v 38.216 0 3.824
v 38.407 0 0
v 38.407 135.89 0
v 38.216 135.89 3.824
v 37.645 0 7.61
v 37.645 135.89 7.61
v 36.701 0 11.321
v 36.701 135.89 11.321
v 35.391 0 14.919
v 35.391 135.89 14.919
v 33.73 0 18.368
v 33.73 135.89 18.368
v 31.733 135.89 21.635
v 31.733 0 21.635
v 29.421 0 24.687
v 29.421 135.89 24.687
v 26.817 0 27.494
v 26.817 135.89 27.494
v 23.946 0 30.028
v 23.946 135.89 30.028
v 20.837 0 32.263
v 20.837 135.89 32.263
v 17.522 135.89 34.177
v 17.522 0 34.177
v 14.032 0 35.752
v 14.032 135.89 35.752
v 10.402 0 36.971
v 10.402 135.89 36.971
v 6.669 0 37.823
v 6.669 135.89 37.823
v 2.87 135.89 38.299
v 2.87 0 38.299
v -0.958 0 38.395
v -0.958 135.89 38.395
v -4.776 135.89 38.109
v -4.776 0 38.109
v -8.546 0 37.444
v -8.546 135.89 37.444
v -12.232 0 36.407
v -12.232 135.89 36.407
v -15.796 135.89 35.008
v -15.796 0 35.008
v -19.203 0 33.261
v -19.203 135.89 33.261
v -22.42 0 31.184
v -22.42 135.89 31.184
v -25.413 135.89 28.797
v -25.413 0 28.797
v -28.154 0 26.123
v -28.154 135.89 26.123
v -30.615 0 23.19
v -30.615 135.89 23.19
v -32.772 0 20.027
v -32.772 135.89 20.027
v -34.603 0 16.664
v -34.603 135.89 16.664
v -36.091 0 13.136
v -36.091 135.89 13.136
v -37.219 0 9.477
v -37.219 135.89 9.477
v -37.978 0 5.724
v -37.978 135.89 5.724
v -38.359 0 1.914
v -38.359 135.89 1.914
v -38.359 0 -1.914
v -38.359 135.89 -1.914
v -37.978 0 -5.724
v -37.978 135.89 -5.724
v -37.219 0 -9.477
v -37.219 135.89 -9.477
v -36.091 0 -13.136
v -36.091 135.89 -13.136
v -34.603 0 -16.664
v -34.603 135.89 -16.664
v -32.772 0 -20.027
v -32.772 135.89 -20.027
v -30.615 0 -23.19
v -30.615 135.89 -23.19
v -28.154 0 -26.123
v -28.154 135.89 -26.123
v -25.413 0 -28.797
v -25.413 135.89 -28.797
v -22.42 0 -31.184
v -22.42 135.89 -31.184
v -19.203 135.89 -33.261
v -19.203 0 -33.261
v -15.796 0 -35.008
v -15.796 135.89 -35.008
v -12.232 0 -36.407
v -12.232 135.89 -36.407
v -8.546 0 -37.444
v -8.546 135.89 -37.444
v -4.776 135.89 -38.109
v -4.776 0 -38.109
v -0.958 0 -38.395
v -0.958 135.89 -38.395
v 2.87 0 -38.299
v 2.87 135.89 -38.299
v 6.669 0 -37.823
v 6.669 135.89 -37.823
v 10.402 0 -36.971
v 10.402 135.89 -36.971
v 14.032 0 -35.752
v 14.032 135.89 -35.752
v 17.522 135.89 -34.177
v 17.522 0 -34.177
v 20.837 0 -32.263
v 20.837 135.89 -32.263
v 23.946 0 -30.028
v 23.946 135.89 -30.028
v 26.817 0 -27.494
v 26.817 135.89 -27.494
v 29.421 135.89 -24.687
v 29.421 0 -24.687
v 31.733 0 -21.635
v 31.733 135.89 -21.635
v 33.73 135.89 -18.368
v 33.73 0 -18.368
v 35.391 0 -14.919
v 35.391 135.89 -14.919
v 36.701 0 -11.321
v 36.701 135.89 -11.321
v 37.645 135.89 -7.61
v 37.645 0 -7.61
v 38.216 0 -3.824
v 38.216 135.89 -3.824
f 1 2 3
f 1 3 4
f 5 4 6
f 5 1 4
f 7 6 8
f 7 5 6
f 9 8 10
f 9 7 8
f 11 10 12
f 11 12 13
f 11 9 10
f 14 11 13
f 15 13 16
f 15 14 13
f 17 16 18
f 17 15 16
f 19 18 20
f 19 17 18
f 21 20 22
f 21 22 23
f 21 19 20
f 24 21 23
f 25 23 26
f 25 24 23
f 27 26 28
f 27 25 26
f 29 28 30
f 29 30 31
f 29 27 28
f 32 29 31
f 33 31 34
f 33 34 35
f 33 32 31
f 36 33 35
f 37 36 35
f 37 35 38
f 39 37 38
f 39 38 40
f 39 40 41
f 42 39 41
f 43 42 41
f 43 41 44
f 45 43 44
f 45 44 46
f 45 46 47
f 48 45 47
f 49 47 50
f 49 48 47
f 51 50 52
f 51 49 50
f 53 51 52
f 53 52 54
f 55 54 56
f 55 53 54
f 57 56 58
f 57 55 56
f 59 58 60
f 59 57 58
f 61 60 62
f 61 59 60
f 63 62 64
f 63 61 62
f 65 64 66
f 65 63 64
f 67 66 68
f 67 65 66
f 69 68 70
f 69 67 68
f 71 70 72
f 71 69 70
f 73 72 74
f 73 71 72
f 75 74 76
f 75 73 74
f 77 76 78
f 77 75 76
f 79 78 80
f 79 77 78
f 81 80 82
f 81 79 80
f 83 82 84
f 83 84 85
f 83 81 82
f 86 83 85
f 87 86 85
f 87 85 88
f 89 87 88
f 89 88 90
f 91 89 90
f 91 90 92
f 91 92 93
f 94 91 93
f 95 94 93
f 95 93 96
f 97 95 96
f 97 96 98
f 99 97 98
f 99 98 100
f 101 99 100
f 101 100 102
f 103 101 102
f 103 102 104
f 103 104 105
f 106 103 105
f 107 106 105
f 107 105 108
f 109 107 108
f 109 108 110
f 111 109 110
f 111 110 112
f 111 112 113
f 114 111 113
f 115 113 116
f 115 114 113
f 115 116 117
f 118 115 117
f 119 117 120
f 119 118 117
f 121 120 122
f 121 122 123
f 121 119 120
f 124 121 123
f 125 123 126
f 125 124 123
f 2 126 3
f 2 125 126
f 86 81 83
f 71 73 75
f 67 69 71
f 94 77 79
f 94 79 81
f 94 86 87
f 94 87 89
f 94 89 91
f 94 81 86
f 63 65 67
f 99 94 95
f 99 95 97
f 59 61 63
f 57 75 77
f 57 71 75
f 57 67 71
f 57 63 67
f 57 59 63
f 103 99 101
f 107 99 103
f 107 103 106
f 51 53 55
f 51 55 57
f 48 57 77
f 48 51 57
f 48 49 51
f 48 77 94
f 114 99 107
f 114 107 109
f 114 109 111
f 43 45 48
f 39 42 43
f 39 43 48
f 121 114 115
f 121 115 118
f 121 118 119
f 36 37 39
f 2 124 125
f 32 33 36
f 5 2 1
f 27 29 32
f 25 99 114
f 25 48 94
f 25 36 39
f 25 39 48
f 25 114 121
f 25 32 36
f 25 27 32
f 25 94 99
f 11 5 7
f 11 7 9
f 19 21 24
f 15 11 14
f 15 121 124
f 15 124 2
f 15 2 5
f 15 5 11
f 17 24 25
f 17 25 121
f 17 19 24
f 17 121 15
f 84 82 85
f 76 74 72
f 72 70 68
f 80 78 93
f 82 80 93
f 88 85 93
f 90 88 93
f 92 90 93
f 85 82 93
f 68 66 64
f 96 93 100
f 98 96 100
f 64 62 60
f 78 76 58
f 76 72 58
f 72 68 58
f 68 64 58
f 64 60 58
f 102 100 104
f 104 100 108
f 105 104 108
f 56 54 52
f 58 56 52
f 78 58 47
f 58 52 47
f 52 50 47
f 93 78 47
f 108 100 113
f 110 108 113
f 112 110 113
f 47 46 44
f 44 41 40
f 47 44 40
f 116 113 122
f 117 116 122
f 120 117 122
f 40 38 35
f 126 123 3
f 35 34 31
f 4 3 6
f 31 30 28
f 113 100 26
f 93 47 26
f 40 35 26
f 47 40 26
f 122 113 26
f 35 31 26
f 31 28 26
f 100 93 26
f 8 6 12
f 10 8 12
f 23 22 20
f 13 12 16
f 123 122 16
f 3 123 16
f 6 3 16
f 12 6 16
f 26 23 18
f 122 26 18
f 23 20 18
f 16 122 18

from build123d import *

# Parameters (mm, degrees)
F1_W     = 127
F1_H     = 76.2
F2_DEPTH = 25.4
F0_R     = 38.4068488144
F4_DEPTH = 135.89


with BuildPart() as f2:
    # F1 (on Top) → F2 (new body)
    with BuildSketch(Plane.XY):
        Rectangle(F1_W, F1_H)
    extrude(amount=F2_DEPTH)


with BuildPart() as f4:
    # F0 (on Front) → F4 (new body)
    with BuildSketch(Plane.XZ):
        Circle(F0_R)
    extrude(amount=-F4_DEPTH)


solid = f4.part
